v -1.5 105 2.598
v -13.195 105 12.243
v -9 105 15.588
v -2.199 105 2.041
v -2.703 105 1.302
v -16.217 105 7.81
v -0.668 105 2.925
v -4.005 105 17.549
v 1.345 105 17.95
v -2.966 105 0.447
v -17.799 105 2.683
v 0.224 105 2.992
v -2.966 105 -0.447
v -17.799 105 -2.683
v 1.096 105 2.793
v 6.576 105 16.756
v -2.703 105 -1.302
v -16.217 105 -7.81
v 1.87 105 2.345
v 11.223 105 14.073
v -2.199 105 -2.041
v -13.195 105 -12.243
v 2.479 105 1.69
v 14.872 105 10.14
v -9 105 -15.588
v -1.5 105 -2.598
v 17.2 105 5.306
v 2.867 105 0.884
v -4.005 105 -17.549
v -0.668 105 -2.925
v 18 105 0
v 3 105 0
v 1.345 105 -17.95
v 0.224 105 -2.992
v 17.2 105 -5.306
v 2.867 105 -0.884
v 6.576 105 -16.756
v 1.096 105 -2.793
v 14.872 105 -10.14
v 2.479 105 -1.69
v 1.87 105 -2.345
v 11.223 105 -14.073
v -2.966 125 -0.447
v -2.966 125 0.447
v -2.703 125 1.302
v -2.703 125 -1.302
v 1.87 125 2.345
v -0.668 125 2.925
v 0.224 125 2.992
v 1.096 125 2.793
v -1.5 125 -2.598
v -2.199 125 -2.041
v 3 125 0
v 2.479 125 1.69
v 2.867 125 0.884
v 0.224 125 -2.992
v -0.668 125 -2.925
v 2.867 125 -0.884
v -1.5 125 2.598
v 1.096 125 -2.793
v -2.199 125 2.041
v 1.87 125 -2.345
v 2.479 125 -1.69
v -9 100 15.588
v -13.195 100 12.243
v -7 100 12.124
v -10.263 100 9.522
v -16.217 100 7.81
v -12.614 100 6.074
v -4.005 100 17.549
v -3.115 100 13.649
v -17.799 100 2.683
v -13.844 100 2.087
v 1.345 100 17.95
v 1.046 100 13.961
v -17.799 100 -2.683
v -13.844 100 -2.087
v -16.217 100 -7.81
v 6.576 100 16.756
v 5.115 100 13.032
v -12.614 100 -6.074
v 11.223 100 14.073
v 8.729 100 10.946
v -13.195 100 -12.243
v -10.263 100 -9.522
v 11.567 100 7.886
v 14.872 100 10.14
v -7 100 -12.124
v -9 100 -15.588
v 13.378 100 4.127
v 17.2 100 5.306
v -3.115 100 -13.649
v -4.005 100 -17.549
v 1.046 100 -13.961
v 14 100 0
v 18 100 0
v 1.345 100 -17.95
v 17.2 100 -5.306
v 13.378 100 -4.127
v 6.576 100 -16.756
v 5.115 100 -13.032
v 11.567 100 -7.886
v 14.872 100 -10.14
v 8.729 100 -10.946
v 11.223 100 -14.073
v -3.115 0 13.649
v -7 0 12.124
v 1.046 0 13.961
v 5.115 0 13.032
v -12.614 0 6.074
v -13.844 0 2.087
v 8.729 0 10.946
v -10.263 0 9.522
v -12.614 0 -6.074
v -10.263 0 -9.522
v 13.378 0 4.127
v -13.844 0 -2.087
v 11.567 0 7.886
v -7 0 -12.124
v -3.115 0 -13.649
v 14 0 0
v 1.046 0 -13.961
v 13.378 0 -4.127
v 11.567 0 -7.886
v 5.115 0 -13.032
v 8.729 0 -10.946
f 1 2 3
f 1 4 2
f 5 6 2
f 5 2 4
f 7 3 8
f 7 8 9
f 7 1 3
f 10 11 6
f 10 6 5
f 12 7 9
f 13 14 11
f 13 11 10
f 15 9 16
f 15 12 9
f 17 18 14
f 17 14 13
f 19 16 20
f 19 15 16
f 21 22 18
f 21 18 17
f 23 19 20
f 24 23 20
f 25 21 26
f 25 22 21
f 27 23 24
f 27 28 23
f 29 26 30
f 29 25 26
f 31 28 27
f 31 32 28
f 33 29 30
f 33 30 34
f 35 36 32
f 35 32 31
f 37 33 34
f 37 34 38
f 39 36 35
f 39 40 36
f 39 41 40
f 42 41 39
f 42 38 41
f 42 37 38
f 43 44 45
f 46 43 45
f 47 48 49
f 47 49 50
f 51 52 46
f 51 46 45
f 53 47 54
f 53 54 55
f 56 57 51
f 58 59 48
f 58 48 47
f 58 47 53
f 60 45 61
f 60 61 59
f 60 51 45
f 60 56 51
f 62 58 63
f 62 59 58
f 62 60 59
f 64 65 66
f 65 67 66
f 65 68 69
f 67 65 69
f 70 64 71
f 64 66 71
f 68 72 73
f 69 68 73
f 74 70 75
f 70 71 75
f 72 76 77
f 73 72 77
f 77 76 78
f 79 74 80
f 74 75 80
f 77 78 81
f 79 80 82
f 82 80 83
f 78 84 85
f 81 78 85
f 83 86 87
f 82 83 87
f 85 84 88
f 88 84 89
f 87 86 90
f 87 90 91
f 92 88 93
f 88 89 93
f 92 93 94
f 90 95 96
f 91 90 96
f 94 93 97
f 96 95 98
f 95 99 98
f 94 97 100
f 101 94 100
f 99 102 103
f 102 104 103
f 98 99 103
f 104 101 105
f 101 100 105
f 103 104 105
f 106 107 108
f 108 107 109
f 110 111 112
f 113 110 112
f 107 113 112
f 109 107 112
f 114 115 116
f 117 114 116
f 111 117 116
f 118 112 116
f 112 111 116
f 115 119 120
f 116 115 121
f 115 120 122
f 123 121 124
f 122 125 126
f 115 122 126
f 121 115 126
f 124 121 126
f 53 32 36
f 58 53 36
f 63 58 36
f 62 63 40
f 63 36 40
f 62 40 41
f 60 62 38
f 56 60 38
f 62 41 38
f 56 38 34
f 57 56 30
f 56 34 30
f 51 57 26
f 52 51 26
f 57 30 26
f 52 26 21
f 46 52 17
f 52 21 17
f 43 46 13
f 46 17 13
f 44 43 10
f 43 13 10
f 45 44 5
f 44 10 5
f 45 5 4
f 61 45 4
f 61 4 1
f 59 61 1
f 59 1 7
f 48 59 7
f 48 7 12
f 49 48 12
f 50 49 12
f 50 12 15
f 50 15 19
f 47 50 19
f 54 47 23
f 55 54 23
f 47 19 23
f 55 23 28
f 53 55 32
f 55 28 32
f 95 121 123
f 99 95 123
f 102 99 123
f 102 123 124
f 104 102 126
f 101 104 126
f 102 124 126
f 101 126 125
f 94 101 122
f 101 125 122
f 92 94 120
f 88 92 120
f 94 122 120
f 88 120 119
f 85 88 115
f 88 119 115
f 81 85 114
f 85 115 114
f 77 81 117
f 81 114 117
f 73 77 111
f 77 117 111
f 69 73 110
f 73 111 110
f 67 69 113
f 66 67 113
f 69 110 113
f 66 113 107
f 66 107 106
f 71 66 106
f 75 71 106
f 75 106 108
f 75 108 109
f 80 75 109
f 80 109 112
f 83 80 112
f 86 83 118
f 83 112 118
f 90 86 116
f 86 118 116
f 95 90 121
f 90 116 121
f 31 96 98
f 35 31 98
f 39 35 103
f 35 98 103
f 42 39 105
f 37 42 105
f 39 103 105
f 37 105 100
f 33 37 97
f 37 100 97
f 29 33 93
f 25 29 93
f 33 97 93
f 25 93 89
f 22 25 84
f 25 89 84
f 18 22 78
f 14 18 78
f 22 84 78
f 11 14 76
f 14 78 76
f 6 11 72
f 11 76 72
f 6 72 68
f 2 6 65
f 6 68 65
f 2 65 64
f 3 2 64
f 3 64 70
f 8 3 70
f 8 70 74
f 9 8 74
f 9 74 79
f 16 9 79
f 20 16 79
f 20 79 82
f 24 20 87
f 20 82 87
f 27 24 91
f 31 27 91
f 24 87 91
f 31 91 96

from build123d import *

# Parameters (mm, degrees)
SKETCH1_R           = 14
BOSS_EXTRUDE1_DEPTH = 100
SKETCH2_R           = 18
BOSS_EXTRUDE2_DEPTH = 5
SKETCH3_R           = 3
BOSS_EXTRUDE3_DEPTH = 20


with BuildPart() as part:
    # Sketch1 → Boss-Extrude1 (new body)
    with BuildSketch(Plane(origin=(0, 0, 0), x_dir=(1, 0, 0), z_dir=(0, 1, 0))):
        Circle(SKETCH1_R)
    extrude(amount=BOSS_EXTRUDE1_DEPTH)

    # Sketch2 → Boss-Extrude2 (add)
    with BuildSketch(Plane(origin=(0, 100, 0), x_dir=(1, 0, 0), z_dir=(0, 1, 0))):
        Circle(SKETCH2_R)
    extrude(amount=BOSS_EXTRUDE2_DEPTH)

    # Sketch3 → Boss-Extrude3 (add)
    with BuildSketch(Plane(origin=(0, 105, 0), x_dir=(1, 0, 0), z_dir=(0, 1, 0))):
        Circle(SKETCH3_R)
    extrude(amount=BOSS_EXTRUDE3_DEPTH)


solid = part.part
